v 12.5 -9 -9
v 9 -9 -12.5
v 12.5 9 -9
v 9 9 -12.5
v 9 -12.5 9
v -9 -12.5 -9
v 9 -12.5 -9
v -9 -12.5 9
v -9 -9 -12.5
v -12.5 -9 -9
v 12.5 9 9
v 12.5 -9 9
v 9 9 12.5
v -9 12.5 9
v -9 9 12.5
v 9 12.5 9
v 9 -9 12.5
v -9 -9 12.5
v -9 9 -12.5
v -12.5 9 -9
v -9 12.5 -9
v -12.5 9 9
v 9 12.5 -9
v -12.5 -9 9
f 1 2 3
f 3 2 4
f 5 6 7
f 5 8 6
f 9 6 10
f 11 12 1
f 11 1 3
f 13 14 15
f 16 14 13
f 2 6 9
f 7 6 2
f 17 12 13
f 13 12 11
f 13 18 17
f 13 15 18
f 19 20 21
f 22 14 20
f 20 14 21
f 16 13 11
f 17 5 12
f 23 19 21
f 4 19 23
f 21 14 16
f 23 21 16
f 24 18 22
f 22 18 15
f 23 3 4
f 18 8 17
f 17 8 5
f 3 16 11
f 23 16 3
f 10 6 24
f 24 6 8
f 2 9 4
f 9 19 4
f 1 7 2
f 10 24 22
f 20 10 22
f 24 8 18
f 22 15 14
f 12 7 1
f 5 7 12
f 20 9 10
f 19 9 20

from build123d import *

# Parameters (mm, degrees)
F0_W     = 25
F0_H     = 25
F1_DEPTH = 12.5
F2_SIZE  = 3.5


with BuildPart() as f1:
    # F0 (on Top) → F1 (new body, symmetric)
    with BuildSketch(Plane.XY):
        Rectangle(F0_W, F0_H)
    extrude(amount=F1_DEPTH, both=True)

    # F2
    f2_edges = [f1.edges().sort_by_distance(p)[0] for p in [
        (0, -12.5, -12.5),
        (12.5, -12.5, 0),
        (0, -12.5, 12.5),
        (-12.5, -12.5, 0),
        (12.5, 0, 12.5),
        (0, 12.5, 12.5),
        (-12.5, 0, 12.5),
        (-12.5, 12.5, 0),
        (-12.5, 0, -12.5),
        (12.5, 0, -12.5),
        (12.5, 12.5, 0),
        (0, 12.5, -12.5),
    ]]
    chamfer(f2_edges, length=F2_SIZE)


solid = f1.part
